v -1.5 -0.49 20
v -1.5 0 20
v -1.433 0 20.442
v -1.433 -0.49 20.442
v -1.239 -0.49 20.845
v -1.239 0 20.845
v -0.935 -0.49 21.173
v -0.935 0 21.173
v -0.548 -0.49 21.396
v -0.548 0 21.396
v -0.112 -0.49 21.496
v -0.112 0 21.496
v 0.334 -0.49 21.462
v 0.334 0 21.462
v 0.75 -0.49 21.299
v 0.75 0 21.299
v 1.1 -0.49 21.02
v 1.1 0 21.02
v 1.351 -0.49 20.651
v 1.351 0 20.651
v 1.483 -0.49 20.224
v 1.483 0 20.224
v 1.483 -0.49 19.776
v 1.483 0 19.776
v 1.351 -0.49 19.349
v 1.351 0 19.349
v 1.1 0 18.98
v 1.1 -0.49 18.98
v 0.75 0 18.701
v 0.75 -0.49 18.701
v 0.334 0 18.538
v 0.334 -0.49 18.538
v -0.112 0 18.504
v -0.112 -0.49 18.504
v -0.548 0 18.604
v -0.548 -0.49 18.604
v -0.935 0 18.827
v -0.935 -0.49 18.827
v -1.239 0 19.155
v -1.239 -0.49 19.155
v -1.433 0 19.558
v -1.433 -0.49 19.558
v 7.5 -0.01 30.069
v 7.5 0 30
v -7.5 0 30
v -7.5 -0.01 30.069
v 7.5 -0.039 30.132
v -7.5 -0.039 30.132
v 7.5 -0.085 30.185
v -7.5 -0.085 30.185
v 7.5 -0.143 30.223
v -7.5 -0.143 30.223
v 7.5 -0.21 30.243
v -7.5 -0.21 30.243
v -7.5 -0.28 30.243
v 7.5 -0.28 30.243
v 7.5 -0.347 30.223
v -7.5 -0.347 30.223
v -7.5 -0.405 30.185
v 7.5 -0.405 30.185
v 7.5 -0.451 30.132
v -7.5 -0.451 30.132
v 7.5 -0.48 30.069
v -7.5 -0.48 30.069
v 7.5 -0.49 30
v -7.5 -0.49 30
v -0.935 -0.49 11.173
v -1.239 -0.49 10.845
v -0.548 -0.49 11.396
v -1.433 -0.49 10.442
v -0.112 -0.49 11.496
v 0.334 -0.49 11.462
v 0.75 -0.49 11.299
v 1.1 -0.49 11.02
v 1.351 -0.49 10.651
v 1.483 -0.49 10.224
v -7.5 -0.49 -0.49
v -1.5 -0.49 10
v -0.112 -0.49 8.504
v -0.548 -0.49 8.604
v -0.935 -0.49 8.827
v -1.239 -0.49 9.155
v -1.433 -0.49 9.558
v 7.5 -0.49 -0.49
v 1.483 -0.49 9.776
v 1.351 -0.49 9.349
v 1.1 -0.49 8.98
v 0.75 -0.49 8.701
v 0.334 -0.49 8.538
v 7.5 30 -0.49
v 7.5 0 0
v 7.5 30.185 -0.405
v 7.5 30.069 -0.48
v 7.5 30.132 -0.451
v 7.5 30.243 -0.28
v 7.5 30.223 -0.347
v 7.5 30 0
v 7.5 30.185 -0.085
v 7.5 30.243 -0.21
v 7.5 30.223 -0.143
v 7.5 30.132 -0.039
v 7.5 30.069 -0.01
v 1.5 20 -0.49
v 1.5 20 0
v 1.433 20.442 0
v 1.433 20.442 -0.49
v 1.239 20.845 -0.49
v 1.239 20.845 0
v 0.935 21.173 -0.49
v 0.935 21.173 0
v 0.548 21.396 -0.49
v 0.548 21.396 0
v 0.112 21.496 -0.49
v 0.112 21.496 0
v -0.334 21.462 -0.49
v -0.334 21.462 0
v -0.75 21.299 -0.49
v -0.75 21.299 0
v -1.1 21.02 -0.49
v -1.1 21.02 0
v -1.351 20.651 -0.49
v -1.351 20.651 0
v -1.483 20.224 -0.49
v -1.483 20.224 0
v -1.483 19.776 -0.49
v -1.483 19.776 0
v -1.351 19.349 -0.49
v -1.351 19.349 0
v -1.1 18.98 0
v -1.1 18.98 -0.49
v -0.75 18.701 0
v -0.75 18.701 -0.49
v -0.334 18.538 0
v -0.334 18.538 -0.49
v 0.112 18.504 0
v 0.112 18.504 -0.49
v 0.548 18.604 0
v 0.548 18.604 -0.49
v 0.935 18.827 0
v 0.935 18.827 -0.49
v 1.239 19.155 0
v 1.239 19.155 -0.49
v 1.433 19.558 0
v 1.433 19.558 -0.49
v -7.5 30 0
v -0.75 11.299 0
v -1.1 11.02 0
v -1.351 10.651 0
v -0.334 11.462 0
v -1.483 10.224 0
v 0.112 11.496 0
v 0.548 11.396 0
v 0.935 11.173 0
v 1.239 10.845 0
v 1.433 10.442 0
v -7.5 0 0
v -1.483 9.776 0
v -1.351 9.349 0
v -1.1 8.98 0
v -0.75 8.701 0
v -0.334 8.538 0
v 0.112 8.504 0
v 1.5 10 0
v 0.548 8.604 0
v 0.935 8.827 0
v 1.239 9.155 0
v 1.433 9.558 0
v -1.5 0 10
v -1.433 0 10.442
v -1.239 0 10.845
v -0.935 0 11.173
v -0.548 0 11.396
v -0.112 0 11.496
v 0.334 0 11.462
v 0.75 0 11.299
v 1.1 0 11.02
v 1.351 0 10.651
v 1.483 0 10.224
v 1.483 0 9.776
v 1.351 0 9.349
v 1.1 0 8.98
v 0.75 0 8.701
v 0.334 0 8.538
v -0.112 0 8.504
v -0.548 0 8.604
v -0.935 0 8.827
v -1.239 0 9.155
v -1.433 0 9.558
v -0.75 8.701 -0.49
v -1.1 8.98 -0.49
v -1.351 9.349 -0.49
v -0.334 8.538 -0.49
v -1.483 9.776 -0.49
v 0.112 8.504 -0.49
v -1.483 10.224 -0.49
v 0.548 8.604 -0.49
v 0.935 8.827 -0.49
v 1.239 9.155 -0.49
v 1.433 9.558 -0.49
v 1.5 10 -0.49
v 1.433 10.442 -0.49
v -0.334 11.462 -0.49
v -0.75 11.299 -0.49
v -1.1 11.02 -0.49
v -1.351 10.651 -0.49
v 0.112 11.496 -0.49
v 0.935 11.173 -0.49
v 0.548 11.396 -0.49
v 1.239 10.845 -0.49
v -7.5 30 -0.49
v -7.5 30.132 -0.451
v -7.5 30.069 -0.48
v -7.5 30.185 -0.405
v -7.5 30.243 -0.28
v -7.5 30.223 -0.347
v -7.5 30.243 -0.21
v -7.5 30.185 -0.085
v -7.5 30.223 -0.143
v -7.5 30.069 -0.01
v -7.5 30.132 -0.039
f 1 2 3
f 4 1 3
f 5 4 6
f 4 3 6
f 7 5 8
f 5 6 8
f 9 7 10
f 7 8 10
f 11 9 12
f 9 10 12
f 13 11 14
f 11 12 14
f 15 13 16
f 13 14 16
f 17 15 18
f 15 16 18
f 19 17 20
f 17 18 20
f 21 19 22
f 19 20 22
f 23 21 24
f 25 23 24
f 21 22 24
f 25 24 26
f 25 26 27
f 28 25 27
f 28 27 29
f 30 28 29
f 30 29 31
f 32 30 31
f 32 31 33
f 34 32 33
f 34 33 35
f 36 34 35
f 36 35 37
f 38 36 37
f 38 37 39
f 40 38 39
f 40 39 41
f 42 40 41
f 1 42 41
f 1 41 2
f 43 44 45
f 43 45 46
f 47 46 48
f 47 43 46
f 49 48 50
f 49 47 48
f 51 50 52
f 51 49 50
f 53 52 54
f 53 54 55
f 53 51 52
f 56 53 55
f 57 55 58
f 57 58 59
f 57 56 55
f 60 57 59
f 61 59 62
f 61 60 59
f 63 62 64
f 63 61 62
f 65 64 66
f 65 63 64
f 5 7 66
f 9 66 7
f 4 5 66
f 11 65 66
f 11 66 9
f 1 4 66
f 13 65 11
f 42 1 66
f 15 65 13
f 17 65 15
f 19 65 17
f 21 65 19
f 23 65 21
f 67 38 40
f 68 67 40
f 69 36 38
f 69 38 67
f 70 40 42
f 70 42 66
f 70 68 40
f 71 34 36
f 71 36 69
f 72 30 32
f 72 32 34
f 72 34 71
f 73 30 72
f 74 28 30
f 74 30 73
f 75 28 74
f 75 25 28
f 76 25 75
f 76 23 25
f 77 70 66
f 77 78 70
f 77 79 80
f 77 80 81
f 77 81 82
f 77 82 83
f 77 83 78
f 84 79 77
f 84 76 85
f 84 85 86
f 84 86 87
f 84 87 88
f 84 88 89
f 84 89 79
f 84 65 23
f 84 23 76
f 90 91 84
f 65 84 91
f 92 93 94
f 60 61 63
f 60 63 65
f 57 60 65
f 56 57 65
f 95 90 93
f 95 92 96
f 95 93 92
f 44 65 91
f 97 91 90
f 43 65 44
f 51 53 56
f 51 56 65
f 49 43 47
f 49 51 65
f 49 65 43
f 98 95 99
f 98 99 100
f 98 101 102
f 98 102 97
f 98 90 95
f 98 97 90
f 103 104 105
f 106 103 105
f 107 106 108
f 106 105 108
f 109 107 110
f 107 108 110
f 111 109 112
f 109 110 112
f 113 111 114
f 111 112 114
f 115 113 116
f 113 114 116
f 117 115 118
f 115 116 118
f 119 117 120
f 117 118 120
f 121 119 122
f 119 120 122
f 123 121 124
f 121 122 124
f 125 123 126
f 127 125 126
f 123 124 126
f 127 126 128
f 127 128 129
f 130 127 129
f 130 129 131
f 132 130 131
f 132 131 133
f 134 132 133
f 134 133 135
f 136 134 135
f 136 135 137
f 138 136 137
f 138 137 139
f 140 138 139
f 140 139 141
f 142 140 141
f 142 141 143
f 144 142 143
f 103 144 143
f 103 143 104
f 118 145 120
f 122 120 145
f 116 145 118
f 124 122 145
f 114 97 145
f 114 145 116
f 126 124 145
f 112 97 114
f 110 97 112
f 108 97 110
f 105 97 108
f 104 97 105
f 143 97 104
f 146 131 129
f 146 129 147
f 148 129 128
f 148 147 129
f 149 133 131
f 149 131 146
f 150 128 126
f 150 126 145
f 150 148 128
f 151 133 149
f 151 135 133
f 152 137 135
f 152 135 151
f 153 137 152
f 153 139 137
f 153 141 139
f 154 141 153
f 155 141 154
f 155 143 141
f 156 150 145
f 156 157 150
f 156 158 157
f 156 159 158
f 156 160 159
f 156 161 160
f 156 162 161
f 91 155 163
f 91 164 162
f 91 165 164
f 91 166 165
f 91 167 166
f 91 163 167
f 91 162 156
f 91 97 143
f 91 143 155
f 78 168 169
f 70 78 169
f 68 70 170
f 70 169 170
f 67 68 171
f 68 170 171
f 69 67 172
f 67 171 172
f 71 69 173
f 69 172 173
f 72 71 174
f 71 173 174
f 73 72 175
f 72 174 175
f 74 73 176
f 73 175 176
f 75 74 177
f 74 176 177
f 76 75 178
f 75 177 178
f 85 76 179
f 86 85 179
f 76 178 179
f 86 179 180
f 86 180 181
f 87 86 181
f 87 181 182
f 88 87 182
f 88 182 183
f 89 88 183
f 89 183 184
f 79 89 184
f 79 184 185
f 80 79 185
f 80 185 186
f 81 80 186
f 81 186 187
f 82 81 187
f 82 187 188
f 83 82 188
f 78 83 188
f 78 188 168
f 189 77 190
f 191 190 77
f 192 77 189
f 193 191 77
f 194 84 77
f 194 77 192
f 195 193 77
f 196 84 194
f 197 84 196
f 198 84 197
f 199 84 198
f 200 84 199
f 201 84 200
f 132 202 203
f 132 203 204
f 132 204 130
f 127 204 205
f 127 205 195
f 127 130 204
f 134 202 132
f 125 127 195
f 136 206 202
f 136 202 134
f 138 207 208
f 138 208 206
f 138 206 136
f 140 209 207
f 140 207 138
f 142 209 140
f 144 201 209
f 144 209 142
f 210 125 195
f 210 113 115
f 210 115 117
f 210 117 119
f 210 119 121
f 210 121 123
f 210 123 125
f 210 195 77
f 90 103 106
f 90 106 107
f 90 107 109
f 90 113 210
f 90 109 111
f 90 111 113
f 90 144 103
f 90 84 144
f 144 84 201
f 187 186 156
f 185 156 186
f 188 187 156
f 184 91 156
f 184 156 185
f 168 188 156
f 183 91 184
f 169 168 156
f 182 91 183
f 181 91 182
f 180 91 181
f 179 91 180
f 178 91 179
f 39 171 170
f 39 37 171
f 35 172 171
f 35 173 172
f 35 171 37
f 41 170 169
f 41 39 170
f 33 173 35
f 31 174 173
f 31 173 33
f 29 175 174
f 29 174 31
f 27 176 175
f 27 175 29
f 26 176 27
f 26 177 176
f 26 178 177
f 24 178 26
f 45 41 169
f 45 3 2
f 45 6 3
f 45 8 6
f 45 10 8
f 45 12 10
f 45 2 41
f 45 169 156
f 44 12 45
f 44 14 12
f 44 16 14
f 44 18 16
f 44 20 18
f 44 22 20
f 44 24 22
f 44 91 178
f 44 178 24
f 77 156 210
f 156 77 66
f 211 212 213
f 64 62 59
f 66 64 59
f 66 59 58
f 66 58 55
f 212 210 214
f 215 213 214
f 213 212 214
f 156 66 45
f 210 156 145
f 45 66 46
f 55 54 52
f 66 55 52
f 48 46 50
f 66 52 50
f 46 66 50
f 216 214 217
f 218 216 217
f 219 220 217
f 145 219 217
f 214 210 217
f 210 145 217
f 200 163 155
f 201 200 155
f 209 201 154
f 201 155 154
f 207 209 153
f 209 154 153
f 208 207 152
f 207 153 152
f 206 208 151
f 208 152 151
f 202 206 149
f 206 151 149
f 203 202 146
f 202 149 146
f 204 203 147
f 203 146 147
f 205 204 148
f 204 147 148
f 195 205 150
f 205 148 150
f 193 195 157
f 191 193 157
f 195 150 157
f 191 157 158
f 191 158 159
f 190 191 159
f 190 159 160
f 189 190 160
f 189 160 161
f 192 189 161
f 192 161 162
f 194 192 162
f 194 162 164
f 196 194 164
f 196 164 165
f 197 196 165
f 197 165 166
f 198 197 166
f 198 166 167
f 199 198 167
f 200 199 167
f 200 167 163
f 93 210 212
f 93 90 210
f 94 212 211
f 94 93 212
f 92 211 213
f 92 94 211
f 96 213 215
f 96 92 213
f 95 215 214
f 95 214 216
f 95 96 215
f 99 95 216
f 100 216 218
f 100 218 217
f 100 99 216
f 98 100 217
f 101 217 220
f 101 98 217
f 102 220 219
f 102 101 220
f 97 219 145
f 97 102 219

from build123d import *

# Parameters (mm, degrees)
F1_DEPTH = 7.5
F2_R     = 1.5
F3_DEPTH = 0.4910000058
F4_R     = 1.5
F5_DEPTH = 0.4910000058


with BuildPart() as f1:
    # F0 (on Right) → F1 (new body, symmetric)
    with BuildSketch(Plane.YZ):
        with BuildLine():
            Line((0, 0), (0, 30))
            ThreePointArc((0, 30), (-0.2450000029, 30.2450000029), (-0.4900000058, 30))
            Line((-0.4900000058, 30), (-0.4900000058, -0.4900000058))
            Line((-0.4900000058, -0.4900000058), (30, -0.4900000058))
            ThreePointArc((30, -0.4900000058), (30.2450000029, -0.2450000029), (30, 0))
            Line((30, 0), (0, 0))
        make_face()
    extrude(amount=F1_DEPTH, both=True)

    # F2 (on face) → F3 (cut, through all)
    with BuildSketch(Plane(origin=(0, 0, 0), x_dir=(-1, 0, 0), z_dir=(0, 1, 0))):
        with Locations((0, 20)):
            Circle(F2_R)
        with Locations((0, 10)):
            Circle(F2_R)
    extrude(amount=-F3_DEPTH, mode=Mode.SUBTRACT)

    # F4 (on face) → F5 (cut, through all)
    with BuildSketch(Plane.XY):
        with Locations((0, 20)):
            Circle(F4_R)
        with Locations((0, 10)):
            Circle(F4_R)
    extrude(amount=-F5_DEPTH, mode=Mode.SUBTRACT)


solid = f1.part
